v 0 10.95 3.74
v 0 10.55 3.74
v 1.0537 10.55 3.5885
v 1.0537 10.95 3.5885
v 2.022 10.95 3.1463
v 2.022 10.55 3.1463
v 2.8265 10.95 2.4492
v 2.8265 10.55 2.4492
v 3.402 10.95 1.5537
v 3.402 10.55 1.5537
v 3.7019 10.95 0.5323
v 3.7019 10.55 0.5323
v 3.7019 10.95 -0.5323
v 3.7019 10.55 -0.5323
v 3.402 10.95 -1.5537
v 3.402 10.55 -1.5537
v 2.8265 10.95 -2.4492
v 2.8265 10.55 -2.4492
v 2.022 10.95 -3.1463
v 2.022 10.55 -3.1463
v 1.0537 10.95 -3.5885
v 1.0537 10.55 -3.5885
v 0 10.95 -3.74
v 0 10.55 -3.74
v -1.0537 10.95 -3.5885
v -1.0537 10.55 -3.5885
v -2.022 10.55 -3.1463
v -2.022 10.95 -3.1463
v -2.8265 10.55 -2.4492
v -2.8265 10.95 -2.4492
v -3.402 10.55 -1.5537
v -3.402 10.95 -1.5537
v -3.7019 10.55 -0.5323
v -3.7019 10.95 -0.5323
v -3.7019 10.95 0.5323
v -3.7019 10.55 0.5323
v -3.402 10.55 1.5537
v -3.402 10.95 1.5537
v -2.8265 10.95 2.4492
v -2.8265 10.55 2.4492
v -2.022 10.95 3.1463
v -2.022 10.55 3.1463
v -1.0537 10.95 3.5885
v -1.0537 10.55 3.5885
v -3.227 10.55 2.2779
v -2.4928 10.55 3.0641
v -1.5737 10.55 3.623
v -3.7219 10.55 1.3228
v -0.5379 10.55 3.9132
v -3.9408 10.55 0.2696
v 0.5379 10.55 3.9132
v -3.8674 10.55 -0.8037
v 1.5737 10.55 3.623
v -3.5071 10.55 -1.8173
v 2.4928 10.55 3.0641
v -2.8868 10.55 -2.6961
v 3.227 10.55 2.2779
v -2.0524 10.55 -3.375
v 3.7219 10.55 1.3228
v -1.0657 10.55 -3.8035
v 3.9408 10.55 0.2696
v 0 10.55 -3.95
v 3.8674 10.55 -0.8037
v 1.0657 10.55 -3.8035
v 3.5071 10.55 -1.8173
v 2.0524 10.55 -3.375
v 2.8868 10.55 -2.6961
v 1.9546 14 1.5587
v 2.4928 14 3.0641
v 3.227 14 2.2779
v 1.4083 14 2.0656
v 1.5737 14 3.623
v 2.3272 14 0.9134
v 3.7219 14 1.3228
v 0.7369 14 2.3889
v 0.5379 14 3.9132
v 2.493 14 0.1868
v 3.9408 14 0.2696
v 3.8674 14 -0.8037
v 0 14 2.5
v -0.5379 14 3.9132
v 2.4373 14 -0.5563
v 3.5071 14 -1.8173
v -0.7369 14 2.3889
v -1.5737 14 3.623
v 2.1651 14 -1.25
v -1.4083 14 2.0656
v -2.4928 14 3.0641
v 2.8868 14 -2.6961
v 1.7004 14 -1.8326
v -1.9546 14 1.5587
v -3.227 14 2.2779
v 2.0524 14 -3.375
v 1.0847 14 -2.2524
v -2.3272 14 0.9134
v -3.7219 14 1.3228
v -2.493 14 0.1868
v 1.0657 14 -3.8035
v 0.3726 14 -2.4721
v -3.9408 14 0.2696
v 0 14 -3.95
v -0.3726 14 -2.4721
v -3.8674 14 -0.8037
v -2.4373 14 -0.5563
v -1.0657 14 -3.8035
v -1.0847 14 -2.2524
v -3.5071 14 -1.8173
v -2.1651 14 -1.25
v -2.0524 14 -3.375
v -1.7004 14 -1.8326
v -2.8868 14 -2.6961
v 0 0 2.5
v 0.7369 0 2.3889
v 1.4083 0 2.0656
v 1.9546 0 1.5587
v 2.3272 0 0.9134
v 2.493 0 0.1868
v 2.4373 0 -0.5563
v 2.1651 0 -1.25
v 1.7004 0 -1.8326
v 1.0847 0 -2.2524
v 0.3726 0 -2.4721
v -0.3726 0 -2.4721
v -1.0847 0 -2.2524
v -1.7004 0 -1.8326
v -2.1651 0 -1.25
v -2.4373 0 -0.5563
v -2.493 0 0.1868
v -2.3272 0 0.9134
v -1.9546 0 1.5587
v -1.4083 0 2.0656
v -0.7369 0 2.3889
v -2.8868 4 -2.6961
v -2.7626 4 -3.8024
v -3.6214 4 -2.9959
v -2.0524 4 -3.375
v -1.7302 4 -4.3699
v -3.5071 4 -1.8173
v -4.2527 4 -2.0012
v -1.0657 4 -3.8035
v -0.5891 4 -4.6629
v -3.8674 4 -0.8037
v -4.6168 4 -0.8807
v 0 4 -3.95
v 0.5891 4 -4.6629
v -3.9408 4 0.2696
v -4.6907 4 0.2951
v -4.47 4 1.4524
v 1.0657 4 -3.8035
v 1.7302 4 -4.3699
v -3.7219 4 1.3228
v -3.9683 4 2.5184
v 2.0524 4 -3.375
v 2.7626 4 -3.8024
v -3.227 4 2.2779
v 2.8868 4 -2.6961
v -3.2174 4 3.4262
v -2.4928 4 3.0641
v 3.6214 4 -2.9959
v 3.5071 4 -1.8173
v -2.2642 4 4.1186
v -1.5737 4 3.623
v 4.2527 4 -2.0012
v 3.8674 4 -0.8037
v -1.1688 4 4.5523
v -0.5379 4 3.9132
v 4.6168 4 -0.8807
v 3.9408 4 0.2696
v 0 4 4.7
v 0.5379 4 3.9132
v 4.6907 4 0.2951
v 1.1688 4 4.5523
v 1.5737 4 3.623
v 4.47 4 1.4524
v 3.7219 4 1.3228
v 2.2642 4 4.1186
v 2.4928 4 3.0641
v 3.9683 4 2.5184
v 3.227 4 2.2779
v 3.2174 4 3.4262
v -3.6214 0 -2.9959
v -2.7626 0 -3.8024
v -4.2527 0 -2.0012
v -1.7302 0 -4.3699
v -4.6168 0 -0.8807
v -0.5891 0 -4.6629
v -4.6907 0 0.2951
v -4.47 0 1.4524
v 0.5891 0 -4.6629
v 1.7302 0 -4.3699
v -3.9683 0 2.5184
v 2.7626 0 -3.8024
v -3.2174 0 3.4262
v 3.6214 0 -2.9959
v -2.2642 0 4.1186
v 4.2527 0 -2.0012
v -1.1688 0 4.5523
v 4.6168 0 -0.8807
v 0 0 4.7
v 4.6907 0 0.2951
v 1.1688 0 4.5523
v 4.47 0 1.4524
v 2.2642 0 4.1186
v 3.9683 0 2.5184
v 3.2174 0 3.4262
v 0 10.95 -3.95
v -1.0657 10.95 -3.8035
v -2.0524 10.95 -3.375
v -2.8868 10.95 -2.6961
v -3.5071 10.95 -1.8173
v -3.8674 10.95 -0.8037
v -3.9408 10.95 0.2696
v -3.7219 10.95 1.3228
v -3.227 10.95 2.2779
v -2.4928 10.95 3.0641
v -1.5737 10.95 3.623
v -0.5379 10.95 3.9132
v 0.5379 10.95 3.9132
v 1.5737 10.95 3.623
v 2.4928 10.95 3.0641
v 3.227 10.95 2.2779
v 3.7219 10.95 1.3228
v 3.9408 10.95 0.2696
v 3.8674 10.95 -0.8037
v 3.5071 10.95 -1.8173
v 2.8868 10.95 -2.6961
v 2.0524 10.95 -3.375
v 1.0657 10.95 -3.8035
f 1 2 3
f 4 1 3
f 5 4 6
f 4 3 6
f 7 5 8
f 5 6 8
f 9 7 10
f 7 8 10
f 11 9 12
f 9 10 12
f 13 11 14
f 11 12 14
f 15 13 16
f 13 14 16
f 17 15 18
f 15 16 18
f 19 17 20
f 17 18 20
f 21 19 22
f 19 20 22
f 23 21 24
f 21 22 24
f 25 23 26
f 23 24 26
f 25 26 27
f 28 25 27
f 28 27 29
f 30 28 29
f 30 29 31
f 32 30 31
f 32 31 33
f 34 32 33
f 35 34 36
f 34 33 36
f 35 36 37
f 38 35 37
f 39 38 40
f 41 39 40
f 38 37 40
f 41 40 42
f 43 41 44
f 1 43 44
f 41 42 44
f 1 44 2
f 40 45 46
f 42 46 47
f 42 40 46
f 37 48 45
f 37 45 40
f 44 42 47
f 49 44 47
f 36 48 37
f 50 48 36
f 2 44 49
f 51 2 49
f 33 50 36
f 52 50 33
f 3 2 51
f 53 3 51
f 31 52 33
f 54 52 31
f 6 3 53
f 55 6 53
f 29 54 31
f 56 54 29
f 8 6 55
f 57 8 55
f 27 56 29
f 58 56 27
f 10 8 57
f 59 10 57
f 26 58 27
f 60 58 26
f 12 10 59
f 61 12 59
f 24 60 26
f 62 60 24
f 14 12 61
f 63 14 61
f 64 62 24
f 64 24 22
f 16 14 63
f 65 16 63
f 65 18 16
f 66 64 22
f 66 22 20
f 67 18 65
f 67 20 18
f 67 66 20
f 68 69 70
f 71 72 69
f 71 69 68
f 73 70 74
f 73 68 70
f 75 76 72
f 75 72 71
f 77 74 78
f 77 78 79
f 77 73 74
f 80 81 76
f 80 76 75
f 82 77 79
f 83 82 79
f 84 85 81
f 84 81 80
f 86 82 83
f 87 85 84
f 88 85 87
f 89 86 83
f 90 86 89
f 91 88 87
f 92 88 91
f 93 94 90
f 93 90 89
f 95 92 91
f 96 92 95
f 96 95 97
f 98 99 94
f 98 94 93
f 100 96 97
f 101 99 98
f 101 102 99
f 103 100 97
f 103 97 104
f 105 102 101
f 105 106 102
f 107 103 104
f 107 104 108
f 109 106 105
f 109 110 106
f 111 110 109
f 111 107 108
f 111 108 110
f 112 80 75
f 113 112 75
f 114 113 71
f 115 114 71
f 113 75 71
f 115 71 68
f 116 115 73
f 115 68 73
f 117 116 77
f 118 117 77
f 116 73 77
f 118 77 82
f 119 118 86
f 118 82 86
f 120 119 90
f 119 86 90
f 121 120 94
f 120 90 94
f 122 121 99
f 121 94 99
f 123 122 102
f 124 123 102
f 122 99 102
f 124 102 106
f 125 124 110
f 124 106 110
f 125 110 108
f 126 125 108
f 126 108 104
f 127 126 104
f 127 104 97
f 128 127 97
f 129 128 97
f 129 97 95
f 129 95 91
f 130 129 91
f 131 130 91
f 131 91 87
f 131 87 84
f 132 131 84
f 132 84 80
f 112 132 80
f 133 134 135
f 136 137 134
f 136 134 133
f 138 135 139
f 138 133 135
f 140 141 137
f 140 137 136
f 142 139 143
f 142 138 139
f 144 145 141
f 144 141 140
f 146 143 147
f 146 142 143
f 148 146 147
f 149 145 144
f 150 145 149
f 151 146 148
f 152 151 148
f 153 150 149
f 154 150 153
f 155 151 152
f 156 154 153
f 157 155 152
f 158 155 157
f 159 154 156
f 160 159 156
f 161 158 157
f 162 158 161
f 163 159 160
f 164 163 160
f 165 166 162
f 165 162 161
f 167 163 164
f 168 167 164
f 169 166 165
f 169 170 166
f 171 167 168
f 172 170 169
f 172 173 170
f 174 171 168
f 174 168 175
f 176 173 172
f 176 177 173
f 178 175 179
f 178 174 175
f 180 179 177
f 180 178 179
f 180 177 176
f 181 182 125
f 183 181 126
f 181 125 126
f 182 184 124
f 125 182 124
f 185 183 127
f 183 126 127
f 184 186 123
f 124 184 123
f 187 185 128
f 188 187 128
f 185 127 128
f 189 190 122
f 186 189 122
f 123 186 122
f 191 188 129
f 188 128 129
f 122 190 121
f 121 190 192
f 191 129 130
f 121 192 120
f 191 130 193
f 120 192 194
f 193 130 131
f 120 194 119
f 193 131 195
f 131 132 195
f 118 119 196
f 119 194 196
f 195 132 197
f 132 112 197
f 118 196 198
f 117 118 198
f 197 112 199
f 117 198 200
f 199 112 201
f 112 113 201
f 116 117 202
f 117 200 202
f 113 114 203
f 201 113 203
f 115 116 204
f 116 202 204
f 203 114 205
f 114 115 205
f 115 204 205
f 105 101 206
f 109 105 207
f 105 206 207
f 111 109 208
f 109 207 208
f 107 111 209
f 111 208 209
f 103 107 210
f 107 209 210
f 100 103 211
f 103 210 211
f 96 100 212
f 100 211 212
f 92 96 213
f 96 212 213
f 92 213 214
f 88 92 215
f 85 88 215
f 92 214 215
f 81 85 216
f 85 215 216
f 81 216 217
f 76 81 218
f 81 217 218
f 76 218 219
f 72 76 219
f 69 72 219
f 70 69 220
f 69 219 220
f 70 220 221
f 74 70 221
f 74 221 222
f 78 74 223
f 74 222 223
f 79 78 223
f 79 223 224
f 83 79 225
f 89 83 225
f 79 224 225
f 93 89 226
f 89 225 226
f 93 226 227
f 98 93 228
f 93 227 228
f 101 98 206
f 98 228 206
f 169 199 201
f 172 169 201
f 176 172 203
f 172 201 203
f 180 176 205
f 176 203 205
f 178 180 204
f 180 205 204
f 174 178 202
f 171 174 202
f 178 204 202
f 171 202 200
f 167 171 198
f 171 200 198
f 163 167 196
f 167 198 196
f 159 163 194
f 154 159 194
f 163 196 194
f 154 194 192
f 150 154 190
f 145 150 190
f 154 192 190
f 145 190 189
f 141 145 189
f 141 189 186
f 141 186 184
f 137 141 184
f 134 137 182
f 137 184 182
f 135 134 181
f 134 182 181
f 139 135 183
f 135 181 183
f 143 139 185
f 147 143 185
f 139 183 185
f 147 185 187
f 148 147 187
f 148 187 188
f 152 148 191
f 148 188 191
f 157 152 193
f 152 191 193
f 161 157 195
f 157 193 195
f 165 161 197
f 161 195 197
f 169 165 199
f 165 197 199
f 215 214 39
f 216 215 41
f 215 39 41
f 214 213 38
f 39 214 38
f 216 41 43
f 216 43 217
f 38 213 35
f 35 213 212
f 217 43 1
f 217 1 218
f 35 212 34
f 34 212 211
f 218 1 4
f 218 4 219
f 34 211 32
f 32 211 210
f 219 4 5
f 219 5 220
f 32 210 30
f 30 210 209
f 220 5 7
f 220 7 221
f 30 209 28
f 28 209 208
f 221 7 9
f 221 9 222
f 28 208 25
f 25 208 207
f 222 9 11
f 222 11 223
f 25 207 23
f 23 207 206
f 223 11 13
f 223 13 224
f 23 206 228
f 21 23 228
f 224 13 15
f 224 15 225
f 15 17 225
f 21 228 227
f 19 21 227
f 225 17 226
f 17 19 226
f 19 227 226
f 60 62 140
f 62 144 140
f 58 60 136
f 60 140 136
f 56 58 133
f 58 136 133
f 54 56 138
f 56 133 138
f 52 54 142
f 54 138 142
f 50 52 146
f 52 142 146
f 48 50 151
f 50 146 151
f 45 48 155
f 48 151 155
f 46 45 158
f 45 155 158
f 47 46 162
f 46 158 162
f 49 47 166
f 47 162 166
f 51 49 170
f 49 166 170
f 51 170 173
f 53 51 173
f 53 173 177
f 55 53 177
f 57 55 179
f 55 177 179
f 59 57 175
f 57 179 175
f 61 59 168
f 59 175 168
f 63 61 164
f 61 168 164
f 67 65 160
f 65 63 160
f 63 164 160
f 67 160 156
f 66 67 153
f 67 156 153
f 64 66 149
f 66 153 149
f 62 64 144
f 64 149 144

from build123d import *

# Parameters (mm, degrees)
SKETCH1_R                = 4.7
BOSS_EXTRUDE1_DEPTH      = 4
SKETCH2_R                = 3.95
BOSS_EXTRUDE2_DEPTH      = 6.5
SKETCH3_R                = 3.95
BOSS_EXTRUDE3_DEPTH      = 1
SKETCH4_R                = 3.95
BOSS_EXTRUDE4_DEPTH      = 2.5
SKETCH5_R                = 2.5
CUT_EXTRUDE1_DEPTH       = 16.497741771
CUT_EXTRUDE_1_DEPTH      = 0.2
CUT_EXTRUDE_1_DEPTH_BACK = 0.2
SKETCH_1_OUTSIDE_W       = 15.262
SKETCH_1_OUTSIDE_H       = 15.262
SKETCH_1_OUTSIDE_R       = 3.74


with BuildPart() as part:
    # Sketch1 → Boss-Extrude1 (new body)
    with BuildSketch(Plane(origin=(0, 0, 0), x_dir=(1, 0, 0), z_dir=(0, 1, 0))):
        with Locations(Location((0, 0, 0), (0, 0, 270))):
            Circle(SKETCH1_R)
    extrude(amount=BOSS_EXTRUDE1_DEPTH)

    # Sketch2 → Boss-Extrude2 (add)
    with BuildSketch(Plane(origin=(0, 4, 0), x_dir=(1, 0, 0), z_dir=(0, 1, 0))):
        with Locations(Location((0, 0, 0), (0, 0, 90))):
            Circle(SKETCH2_R)
    extrude(amount=BOSS_EXTRUDE2_DEPTH)

    # Sketch3 → Boss-Extrude3 (add)
    with BuildSketch(Plane(origin=(0, 10.5, 0), x_dir=(1, 0, 0), z_dir=(0, 1, 0))):
        with Locations(Location((0, 0, 0), (0, 0, 90))):
            Circle(SKETCH3_R)
    extrude(amount=BOSS_EXTRUDE3_DEPTH)

    # Sketch4 → Boss-Extrude4 (add)
    with BuildSketch(Plane(origin=(0, 11.5, 0), x_dir=(1, 0, 0), z_dir=(0, 1, 0))):
        with Locations(Location((0, 0, 0), (0, 0, 90))):
            Circle(SKETCH4_R)
    extrude(amount=BOSS_EXTRUDE4_DEPTH)

    # Sketch5 → Cut-Extrude1 (cut, through all)
    with BuildSketch(Plane(origin=(0, 14, 0), x_dir=(1, 0, 0), z_dir=(0, 1, 0))):
        with Locations(Location((0, 0, 0), (0, 0, 270))):
            Circle(SKETCH5_R)
    extrude(amount=-CUT_EXTRUDE1_DEPTH, mode=Mode.SUBTRACT)

    # 草图1 outside → 切除-拉伸1 (cut, two sides: drawn at the far end of the back side and taken through both)
    with BuildSketch(Plane(origin=(0, 10.75, 0), x_dir=(1, 0, 0), z_dir=(0, 1, 0)).offset(-CUT_EXTRUDE_1_DEPTH_BACK)):
        Rectangle(SKETCH_1_OUTSIDE_W, SKETCH_1_OUTSIDE_H)
        with Locations(Location((0, 0, 0), (0, 0, 270))):
            Circle(SKETCH_1_OUTSIDE_R, mode=Mode.SUBTRACT)
    extrude(amount=CUT_EXTRUDE_1_DEPTH + CUT_EXTRUDE_1_DEPTH_BACK, mode=Mode.SUBTRACT)


solid = part.part
